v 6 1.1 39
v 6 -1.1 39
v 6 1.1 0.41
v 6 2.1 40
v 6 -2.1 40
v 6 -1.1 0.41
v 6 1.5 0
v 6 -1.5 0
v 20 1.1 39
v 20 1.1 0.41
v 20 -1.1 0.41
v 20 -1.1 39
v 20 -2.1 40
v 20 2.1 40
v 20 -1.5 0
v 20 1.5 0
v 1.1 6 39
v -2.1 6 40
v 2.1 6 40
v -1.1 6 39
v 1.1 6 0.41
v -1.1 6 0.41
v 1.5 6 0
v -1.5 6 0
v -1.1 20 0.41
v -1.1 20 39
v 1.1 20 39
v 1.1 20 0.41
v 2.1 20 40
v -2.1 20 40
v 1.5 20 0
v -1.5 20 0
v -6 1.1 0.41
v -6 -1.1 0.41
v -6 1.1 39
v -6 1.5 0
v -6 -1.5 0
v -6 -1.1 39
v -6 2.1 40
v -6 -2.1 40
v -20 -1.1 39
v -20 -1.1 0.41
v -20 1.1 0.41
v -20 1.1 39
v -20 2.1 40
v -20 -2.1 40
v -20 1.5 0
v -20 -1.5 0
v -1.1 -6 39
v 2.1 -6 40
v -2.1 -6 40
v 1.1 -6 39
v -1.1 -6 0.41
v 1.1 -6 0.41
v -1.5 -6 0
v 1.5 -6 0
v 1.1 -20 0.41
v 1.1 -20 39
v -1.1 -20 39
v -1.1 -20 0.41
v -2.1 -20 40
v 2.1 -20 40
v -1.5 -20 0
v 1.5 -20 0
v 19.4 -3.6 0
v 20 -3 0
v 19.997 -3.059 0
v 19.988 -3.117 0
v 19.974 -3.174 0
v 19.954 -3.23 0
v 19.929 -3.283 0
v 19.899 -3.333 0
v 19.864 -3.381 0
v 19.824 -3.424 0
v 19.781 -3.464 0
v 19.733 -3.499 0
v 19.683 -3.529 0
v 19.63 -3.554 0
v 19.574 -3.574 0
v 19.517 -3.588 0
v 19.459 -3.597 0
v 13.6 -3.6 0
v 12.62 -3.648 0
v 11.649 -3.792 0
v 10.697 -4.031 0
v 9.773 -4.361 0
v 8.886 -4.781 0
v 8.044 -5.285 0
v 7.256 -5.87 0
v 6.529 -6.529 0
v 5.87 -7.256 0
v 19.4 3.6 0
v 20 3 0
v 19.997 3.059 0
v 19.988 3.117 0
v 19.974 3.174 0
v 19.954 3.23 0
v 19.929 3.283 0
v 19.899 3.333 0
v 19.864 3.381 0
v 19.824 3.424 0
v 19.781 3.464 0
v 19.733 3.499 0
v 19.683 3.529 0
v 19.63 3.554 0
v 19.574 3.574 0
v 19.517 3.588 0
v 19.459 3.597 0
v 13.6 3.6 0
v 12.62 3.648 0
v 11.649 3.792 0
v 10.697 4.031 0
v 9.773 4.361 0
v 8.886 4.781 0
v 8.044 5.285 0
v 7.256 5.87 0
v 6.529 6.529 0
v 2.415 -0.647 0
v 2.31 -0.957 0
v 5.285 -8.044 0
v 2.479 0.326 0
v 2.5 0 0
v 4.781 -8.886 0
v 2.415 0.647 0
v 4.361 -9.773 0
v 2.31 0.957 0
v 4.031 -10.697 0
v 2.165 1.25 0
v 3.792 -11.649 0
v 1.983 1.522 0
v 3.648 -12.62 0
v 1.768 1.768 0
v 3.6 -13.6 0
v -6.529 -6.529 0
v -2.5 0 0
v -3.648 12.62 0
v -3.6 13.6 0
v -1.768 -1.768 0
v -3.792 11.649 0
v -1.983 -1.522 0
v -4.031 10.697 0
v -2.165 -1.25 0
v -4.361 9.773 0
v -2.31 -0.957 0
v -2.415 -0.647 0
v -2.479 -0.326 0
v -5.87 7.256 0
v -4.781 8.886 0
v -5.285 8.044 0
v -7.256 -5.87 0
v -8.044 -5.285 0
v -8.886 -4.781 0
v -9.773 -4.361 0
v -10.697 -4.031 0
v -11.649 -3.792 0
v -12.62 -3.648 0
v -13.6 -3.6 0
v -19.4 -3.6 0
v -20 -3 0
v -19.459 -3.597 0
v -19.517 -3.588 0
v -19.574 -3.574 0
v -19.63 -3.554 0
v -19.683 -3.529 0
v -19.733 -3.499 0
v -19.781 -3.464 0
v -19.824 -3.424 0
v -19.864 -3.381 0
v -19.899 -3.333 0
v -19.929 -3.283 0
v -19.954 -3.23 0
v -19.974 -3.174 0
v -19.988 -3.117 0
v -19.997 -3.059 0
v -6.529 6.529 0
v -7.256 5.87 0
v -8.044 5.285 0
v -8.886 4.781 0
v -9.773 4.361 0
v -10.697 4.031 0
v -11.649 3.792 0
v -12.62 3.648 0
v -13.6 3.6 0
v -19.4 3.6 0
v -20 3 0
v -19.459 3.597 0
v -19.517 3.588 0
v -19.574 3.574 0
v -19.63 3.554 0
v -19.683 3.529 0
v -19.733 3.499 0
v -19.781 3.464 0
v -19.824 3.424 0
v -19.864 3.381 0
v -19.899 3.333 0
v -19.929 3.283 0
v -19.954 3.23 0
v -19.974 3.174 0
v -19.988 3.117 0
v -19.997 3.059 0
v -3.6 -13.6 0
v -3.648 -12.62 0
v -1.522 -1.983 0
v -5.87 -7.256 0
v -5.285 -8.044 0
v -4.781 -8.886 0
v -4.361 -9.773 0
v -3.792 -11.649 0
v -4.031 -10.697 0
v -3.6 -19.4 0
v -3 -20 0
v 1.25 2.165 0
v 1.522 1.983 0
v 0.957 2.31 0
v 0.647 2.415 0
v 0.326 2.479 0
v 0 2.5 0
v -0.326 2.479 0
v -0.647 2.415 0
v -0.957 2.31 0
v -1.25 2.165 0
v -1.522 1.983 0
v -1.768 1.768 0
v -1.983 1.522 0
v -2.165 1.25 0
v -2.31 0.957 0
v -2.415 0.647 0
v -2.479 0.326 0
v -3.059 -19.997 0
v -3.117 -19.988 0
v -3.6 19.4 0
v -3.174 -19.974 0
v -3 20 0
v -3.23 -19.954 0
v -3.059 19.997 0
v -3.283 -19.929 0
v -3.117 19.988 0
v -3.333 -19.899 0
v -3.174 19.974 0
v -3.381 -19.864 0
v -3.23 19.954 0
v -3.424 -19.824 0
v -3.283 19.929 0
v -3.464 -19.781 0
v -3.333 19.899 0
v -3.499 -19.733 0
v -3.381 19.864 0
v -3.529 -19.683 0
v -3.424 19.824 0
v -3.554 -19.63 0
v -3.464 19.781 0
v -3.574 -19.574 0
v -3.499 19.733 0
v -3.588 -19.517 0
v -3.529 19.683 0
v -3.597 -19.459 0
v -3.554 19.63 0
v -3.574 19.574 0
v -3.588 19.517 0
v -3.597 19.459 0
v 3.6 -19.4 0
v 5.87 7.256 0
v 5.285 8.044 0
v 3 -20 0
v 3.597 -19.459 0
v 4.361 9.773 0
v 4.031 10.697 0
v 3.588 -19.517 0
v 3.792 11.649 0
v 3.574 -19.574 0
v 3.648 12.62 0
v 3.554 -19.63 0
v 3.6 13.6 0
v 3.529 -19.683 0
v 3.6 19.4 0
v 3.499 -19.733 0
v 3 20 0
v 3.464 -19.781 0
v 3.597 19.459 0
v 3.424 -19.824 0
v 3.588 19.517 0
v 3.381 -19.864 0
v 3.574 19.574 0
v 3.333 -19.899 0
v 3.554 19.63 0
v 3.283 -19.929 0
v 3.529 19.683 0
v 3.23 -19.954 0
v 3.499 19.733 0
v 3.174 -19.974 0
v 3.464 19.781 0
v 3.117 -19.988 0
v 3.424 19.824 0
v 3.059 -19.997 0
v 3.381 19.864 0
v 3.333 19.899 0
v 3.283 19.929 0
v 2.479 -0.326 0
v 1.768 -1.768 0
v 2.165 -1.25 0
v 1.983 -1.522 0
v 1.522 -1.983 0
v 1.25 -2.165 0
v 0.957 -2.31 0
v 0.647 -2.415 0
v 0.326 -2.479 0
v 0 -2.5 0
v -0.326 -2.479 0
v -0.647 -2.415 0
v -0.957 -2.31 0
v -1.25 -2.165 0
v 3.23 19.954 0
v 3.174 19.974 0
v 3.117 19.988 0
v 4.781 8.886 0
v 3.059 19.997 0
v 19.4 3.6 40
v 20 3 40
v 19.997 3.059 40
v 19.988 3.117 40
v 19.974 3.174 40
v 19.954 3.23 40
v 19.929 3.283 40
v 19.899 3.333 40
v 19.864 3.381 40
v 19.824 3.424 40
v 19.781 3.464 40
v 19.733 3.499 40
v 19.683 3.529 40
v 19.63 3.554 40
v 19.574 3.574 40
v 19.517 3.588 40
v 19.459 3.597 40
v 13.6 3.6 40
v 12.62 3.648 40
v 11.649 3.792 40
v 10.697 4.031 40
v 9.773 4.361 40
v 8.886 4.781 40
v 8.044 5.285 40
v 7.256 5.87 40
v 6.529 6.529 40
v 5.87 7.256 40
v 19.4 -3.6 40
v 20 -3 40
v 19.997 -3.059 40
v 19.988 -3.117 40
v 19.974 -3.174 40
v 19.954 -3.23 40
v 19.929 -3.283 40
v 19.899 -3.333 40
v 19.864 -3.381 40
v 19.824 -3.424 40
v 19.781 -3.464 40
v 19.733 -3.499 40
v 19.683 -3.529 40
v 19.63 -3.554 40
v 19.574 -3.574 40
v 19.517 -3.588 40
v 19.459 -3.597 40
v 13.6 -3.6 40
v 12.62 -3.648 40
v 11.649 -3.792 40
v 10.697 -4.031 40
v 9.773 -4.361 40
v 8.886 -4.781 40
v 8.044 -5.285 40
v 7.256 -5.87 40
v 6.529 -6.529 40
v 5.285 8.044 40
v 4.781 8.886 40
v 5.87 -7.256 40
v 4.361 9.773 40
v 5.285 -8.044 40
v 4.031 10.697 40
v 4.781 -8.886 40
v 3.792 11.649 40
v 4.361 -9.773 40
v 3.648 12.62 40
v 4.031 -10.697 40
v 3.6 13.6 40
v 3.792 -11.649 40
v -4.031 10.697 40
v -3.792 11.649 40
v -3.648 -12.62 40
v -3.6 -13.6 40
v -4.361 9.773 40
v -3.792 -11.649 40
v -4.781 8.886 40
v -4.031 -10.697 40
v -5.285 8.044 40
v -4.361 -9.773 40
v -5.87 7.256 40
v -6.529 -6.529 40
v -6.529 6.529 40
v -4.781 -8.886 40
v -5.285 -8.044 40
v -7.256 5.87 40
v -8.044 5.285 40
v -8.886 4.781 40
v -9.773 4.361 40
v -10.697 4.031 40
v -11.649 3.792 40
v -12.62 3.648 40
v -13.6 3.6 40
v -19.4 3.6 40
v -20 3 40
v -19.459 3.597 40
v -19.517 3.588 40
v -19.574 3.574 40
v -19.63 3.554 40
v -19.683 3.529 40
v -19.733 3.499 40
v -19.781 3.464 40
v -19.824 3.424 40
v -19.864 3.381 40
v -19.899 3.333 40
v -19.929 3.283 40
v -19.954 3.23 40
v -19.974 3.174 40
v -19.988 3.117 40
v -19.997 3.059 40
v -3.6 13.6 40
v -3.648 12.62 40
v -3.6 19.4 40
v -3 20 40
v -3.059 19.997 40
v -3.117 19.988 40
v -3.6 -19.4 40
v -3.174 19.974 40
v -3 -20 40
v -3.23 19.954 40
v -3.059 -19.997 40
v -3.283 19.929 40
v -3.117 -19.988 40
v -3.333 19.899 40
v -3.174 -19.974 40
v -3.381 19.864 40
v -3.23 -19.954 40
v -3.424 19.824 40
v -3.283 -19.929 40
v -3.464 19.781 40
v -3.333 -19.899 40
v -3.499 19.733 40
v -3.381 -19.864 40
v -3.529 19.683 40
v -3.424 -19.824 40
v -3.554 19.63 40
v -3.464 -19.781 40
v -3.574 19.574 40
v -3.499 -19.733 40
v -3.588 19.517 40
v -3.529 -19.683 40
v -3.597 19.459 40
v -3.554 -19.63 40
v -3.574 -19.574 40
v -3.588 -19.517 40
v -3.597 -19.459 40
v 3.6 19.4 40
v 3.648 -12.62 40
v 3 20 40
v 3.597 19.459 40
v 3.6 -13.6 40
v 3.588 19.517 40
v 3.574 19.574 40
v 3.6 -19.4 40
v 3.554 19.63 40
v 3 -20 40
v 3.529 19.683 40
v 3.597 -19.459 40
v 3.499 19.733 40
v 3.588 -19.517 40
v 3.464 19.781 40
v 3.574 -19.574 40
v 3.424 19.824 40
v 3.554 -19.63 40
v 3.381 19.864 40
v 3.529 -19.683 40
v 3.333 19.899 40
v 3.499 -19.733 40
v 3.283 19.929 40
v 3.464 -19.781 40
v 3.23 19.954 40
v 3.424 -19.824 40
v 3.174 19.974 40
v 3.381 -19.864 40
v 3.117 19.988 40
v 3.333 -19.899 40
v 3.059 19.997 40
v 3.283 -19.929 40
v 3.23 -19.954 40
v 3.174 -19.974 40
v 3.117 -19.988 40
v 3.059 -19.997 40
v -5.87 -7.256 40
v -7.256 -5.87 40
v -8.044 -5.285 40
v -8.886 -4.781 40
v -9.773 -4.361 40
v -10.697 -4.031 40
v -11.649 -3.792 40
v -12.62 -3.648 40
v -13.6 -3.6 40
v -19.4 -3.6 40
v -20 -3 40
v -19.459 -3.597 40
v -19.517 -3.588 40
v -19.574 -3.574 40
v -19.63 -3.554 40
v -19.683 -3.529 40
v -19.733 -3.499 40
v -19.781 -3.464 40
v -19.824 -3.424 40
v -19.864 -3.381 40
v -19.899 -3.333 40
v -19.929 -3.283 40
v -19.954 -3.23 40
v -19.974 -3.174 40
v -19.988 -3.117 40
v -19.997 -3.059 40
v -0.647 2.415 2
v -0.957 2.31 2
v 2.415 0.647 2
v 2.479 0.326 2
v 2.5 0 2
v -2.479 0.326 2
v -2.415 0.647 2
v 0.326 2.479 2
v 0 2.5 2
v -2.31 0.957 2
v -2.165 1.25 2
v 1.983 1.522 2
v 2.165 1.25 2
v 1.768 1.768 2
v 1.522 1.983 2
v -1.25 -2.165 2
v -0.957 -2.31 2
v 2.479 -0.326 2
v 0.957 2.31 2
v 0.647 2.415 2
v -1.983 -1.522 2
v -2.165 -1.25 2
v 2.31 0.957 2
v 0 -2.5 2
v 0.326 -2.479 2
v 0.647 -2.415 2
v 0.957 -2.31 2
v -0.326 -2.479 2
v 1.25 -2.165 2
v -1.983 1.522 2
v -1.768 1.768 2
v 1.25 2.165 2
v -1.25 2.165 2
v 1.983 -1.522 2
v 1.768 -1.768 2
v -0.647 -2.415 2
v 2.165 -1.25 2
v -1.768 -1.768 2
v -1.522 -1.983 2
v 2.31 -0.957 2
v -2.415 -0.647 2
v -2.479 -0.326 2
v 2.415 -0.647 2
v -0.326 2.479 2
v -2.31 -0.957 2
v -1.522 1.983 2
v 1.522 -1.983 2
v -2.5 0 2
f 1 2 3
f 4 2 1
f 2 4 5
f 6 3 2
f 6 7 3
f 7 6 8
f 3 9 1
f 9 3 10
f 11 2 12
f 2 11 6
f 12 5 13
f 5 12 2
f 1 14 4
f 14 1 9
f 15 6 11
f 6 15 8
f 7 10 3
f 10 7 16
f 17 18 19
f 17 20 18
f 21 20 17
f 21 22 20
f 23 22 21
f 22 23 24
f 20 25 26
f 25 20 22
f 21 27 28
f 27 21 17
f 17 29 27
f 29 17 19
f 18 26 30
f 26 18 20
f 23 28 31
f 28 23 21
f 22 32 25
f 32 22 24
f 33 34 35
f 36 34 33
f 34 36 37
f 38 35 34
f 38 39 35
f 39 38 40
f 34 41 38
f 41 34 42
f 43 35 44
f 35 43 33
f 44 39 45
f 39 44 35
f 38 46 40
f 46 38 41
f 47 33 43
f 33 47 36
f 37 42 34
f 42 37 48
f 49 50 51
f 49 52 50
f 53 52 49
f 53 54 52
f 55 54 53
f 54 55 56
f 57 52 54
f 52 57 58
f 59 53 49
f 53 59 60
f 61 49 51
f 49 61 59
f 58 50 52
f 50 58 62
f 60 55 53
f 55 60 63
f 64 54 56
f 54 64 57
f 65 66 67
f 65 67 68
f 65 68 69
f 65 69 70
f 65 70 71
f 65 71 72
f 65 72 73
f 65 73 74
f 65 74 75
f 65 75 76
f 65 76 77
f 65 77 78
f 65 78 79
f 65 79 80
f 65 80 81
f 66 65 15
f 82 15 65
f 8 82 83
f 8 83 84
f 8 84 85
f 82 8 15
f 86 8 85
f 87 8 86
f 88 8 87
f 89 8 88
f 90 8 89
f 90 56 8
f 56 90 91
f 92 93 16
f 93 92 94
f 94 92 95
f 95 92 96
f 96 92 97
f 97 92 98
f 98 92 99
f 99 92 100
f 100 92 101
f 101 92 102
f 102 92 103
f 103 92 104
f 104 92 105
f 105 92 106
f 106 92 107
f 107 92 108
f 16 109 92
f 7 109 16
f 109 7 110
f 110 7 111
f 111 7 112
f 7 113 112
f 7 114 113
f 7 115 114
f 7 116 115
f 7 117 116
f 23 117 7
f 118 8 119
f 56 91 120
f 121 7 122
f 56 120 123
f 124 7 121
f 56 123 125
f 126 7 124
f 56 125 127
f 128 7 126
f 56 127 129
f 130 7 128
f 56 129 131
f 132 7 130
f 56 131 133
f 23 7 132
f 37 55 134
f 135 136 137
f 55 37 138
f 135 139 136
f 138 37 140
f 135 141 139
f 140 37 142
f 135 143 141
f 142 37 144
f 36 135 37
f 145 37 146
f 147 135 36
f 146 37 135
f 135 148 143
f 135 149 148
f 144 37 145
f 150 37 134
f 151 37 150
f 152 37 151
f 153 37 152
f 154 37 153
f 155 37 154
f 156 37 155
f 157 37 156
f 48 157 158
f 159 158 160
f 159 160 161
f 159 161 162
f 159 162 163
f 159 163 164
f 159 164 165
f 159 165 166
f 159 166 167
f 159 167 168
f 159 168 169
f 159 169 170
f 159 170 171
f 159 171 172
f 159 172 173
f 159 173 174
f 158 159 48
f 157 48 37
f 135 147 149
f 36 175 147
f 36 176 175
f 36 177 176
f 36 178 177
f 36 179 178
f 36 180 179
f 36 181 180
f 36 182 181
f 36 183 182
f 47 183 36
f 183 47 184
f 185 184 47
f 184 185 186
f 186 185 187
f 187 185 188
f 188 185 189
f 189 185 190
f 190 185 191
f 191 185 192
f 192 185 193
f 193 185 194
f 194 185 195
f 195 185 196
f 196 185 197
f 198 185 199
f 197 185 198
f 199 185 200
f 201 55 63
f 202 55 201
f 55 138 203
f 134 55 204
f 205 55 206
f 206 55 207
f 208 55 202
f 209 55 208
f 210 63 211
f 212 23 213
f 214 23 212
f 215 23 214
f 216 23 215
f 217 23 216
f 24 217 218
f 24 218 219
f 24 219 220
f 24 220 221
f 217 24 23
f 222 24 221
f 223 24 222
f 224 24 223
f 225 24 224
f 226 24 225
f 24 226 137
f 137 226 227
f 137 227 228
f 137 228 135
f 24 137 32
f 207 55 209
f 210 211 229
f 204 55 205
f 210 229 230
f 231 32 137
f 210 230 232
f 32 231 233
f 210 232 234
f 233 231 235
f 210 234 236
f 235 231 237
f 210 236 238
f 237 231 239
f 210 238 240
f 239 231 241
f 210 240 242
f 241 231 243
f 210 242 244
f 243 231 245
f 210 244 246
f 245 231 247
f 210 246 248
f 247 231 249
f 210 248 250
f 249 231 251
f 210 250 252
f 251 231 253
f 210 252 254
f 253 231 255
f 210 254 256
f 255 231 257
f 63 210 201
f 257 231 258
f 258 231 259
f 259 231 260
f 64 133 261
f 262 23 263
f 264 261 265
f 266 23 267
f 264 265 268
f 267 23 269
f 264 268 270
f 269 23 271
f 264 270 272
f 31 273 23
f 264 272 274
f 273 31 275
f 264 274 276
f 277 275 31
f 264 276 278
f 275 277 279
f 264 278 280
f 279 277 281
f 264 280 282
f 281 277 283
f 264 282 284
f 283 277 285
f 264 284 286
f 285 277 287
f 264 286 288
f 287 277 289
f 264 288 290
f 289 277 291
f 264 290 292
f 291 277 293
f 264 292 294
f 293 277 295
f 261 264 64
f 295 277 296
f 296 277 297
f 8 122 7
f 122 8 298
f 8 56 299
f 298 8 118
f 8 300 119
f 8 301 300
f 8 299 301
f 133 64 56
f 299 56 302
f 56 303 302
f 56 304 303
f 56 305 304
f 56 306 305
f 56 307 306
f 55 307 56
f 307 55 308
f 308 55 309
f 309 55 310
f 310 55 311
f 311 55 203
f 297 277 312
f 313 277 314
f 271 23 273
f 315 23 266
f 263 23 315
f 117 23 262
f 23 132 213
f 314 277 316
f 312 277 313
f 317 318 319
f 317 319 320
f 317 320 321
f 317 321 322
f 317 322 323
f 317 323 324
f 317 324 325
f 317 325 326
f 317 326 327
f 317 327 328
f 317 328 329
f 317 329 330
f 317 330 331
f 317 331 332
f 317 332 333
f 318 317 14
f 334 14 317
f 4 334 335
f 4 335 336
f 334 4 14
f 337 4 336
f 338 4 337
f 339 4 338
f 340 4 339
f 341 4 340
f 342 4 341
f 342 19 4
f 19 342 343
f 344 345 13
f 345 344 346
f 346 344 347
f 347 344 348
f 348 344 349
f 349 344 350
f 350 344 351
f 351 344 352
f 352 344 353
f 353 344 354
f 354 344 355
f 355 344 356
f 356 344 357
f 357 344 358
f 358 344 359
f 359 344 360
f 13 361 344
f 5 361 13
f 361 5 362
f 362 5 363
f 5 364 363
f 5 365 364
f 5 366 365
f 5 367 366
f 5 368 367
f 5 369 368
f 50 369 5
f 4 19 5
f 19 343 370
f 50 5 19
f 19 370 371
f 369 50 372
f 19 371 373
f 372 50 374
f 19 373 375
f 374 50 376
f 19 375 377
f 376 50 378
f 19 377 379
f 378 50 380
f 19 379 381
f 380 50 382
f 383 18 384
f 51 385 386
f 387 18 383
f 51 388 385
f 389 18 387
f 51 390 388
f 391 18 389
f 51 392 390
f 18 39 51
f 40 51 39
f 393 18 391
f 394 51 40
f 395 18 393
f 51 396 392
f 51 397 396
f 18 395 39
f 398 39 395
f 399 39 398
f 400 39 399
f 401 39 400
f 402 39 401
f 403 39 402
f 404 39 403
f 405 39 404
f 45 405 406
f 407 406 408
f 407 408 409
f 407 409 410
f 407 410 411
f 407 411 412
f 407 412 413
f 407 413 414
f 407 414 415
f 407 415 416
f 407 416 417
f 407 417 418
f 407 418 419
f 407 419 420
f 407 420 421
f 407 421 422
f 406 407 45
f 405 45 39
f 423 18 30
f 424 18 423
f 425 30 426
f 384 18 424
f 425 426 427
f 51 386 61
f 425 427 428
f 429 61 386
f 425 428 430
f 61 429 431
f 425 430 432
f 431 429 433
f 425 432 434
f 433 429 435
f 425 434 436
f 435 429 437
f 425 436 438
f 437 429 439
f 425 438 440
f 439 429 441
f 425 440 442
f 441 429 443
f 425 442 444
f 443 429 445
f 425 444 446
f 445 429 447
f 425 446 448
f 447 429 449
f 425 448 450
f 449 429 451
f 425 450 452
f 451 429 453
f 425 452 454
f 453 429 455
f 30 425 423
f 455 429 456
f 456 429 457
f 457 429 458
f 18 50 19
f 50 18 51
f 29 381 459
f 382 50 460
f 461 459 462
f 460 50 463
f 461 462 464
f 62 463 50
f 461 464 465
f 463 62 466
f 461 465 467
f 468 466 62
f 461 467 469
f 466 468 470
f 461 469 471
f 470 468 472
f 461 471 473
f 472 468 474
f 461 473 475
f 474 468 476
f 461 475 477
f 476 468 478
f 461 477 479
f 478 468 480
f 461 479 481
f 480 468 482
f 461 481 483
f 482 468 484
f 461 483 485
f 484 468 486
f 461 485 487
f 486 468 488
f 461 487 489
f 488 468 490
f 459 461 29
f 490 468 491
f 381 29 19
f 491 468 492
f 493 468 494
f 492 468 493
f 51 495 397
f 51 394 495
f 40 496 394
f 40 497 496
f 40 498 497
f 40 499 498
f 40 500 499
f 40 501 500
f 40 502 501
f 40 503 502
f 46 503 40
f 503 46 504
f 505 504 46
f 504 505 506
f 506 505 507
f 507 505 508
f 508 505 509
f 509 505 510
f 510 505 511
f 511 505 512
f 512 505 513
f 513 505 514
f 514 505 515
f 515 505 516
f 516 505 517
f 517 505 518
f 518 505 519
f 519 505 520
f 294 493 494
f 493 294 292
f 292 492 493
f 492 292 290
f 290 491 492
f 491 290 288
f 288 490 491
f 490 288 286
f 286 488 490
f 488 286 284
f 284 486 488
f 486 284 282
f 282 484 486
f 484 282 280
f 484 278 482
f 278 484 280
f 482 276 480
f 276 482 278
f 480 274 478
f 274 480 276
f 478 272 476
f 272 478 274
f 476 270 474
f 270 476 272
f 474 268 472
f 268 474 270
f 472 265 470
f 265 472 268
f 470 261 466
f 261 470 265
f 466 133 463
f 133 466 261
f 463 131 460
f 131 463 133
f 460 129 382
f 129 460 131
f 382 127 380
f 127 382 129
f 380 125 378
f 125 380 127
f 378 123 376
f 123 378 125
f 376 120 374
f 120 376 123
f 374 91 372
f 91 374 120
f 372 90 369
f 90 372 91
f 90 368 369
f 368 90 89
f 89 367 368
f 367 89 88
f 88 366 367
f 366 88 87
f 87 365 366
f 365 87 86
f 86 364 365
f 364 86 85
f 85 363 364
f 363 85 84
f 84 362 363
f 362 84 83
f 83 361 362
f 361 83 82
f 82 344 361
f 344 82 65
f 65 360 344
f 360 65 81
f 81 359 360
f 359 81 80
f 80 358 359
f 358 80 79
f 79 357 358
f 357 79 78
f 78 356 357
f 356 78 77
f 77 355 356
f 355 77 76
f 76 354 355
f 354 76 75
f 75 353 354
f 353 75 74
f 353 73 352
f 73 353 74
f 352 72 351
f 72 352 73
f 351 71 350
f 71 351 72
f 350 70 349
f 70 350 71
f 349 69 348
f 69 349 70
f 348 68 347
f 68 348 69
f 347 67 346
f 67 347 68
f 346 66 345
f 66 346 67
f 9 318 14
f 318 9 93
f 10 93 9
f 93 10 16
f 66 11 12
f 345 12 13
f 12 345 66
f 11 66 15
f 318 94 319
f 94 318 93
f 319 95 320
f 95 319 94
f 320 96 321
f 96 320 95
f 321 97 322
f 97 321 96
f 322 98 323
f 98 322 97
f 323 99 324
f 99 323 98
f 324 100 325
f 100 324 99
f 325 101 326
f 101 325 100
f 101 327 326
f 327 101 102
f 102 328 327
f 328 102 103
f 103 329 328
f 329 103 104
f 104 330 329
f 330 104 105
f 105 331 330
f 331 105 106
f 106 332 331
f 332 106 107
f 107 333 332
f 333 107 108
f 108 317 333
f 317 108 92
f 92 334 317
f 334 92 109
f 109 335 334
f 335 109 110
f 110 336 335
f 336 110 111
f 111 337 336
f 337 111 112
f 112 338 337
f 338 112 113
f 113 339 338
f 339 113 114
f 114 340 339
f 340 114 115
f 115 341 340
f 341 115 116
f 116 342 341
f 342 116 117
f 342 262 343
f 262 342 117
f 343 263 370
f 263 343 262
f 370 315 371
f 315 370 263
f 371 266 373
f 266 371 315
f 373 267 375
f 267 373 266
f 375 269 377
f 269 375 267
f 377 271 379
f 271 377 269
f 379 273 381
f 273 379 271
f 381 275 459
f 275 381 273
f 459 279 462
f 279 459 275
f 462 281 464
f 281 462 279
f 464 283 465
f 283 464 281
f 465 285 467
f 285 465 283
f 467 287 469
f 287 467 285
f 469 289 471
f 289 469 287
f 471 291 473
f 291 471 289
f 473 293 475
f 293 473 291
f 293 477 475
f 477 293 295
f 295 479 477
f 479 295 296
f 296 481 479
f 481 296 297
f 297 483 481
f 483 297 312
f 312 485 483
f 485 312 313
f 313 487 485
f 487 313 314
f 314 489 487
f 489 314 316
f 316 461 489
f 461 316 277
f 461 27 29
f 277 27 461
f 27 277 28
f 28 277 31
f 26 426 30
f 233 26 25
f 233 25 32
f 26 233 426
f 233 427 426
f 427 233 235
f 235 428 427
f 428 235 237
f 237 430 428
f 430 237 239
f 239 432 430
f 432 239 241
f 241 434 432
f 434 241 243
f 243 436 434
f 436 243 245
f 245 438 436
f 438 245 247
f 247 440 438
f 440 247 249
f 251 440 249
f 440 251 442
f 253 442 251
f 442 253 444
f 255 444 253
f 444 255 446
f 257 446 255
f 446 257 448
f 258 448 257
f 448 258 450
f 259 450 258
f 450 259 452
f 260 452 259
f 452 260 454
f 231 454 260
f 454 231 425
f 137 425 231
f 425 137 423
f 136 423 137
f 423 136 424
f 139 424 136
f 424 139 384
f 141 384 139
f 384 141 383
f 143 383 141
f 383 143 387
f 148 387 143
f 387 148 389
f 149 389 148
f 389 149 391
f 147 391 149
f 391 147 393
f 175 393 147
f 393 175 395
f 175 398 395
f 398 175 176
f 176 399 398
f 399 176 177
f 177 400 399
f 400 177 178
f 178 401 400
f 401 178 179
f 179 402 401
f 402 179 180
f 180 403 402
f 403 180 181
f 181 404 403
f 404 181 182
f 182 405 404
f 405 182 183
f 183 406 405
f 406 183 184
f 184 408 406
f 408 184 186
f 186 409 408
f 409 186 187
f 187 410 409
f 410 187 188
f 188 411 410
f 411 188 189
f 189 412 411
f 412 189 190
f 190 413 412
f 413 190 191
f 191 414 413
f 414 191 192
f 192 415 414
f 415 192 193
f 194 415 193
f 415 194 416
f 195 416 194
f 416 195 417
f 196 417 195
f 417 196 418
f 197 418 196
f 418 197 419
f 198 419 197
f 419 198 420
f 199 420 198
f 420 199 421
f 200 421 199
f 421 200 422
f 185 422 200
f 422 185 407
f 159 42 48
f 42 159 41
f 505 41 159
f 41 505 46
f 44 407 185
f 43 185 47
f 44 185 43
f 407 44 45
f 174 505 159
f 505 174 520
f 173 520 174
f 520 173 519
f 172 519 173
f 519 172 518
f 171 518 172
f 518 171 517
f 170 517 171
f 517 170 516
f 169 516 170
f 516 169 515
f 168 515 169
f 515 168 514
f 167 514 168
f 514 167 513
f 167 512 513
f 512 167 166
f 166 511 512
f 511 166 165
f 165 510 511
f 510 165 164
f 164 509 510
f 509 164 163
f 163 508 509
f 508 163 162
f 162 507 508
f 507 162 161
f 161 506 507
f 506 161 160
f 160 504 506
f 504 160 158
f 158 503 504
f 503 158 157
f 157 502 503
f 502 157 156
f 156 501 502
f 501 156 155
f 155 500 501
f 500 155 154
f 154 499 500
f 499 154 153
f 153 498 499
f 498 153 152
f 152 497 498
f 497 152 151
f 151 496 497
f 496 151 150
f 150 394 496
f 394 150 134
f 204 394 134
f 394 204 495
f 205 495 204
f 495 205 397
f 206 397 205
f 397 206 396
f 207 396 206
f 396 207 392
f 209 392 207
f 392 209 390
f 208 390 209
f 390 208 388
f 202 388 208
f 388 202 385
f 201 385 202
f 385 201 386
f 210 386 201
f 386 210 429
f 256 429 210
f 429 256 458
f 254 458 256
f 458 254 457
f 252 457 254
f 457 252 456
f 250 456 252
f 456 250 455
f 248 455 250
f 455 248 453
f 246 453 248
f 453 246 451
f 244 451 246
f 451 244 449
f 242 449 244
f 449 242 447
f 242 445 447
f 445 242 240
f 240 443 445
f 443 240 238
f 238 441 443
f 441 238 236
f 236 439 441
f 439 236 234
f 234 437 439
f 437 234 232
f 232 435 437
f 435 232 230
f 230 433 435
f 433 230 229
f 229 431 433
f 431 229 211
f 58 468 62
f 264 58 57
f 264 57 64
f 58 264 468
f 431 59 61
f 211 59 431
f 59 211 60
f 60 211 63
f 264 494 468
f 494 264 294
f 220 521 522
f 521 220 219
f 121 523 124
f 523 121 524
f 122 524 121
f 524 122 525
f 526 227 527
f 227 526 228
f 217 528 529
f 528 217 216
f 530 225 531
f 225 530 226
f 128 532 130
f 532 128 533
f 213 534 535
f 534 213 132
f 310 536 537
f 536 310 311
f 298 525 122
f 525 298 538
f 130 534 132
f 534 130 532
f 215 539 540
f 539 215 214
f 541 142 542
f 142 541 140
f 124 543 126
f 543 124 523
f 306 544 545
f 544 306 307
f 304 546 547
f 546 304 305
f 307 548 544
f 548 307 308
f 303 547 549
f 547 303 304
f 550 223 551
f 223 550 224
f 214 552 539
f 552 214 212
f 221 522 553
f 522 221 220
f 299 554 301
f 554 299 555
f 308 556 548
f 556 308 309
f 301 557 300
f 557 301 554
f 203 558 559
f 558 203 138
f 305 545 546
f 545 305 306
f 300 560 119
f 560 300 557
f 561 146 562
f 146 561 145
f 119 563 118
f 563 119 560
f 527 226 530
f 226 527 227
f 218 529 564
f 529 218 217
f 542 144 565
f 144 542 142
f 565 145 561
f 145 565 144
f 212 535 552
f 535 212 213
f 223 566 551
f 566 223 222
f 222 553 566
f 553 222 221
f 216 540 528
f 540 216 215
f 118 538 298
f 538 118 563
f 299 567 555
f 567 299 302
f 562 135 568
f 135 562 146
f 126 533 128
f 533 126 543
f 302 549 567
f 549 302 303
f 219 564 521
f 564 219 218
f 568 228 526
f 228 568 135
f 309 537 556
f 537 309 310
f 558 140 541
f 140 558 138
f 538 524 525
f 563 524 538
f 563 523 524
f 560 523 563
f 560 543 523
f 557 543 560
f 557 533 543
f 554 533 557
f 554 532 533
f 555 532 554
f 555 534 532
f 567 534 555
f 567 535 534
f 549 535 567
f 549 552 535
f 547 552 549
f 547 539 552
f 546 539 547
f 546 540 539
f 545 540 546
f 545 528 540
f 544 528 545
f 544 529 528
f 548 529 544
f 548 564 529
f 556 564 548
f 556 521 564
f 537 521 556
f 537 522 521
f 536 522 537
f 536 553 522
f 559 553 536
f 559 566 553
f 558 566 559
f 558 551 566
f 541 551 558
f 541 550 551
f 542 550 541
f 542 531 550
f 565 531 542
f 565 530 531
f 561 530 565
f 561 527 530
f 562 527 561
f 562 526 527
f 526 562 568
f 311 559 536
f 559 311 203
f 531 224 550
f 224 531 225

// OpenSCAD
// The Drawer Dividers V3 – Connector
// Cross, T, corner, straight joiner, end piece and slip-on variants.
use <lib/drawer_divider.scad>

/* [Part] */
// Connector type
Type = "cross"; // [cross:Cross (+), tee:T-piece, corner:Corner (L), straight:Straight joiner, end:End piece, slip_cross:Slip-on cross, slip_tee:Slip-on T, slip_corner_r:Slip-on corner right, slip_corner_l:Slip-on corner left]
// How many copies on the plate
Count = 1; // [1:1:40]
// Gap between copies (mm)
Spacing = 4; // [1:1:20]

/* [System] */
// Exact thickness of your printed walls (mm)
Wall_Thickness = 2.0; // [0.8:0.1:10]
// Extra slot width so the wall does not bind (mm, 0.2 fits most printers)
Tolerance = 0.2; // [0:0.01:1]
// Height of the connectors (mm)
Height = 40; // [10:1:150]

/* [Fit & Shape] */
// How deep the wall slides into an arm (mm)
Insert_Depth = 14; // [5:1:30]
// Material left and right of the slot (mm)
Shell_Thickness = 2.5; // [1:0.1:5]
// Arm length measured from the centre (mm)
Arm_Length = 20; // [10:1:100]
// Inner fillet between two arms (mm)
Inner_Fillet = 10; // [0:0.5:20]
// Rounding of the outer edges (mm)
Edge_Radius = 0.6; // [0:0.1:2]
// Closed cap on one end (mm, 0 = open on both ends)
Cap_Thickness = 0; // [0:0.5:10]
// Cap thickness of the slip-on connectors (mm)
Floor_Thickness = 2; // [0.5:0.1:5]
// Chamfer at the slot opening for easy insertion (mm)
Lead_In = 1; // [0:0.1:5]
// Gap between wall end and pocket bottom (mm)
End_Gap = 0.3; // [0:0.1:2]
// Gap between wall top and cap (mm)
Top_Gap = 0.2; // [0:0.05:1]

/* [Print Optimisation] */
// Widens the slots on the first layers against elephant foot (mm, 0 = off)
Elephant_Foot_Compensation = 0.4; // [0:0.1:2]
// Pocket for a magnet or rubber foot underneath (mm, 0 = off)
Magnet_Diameter = 5; // [0:0.1:10]
// Depth of that pocket (mm)
Magnet_Depth = 2; // [0.1:0.1:10]

/* [Hidden] */
$fn = 64;

P = dd_profile(
    wall_t = Wall_Thickness, tol = Tolerance, height = Height,
    insert = Insert_Depth, shell = Shell_Thickness, arm = Arm_Length,
    fillet = Inner_Fillet, edge_r = Edge_Radius, cap = Cap_Thickness,
    floor_t = Floor_Thickness, lead_in = Lead_In, efc = Elephant_Foot_Compensation,
    magnet_d = Magnet_Diameter, magnet_h = Magnet_Depth,
    end_gap = End_Gap, top_gap = Top_Gap);

pitch = dd_connector_size(P) + Spacing;
dd_grid(Count, pitch, pitch) dd_connector(Type, P);
